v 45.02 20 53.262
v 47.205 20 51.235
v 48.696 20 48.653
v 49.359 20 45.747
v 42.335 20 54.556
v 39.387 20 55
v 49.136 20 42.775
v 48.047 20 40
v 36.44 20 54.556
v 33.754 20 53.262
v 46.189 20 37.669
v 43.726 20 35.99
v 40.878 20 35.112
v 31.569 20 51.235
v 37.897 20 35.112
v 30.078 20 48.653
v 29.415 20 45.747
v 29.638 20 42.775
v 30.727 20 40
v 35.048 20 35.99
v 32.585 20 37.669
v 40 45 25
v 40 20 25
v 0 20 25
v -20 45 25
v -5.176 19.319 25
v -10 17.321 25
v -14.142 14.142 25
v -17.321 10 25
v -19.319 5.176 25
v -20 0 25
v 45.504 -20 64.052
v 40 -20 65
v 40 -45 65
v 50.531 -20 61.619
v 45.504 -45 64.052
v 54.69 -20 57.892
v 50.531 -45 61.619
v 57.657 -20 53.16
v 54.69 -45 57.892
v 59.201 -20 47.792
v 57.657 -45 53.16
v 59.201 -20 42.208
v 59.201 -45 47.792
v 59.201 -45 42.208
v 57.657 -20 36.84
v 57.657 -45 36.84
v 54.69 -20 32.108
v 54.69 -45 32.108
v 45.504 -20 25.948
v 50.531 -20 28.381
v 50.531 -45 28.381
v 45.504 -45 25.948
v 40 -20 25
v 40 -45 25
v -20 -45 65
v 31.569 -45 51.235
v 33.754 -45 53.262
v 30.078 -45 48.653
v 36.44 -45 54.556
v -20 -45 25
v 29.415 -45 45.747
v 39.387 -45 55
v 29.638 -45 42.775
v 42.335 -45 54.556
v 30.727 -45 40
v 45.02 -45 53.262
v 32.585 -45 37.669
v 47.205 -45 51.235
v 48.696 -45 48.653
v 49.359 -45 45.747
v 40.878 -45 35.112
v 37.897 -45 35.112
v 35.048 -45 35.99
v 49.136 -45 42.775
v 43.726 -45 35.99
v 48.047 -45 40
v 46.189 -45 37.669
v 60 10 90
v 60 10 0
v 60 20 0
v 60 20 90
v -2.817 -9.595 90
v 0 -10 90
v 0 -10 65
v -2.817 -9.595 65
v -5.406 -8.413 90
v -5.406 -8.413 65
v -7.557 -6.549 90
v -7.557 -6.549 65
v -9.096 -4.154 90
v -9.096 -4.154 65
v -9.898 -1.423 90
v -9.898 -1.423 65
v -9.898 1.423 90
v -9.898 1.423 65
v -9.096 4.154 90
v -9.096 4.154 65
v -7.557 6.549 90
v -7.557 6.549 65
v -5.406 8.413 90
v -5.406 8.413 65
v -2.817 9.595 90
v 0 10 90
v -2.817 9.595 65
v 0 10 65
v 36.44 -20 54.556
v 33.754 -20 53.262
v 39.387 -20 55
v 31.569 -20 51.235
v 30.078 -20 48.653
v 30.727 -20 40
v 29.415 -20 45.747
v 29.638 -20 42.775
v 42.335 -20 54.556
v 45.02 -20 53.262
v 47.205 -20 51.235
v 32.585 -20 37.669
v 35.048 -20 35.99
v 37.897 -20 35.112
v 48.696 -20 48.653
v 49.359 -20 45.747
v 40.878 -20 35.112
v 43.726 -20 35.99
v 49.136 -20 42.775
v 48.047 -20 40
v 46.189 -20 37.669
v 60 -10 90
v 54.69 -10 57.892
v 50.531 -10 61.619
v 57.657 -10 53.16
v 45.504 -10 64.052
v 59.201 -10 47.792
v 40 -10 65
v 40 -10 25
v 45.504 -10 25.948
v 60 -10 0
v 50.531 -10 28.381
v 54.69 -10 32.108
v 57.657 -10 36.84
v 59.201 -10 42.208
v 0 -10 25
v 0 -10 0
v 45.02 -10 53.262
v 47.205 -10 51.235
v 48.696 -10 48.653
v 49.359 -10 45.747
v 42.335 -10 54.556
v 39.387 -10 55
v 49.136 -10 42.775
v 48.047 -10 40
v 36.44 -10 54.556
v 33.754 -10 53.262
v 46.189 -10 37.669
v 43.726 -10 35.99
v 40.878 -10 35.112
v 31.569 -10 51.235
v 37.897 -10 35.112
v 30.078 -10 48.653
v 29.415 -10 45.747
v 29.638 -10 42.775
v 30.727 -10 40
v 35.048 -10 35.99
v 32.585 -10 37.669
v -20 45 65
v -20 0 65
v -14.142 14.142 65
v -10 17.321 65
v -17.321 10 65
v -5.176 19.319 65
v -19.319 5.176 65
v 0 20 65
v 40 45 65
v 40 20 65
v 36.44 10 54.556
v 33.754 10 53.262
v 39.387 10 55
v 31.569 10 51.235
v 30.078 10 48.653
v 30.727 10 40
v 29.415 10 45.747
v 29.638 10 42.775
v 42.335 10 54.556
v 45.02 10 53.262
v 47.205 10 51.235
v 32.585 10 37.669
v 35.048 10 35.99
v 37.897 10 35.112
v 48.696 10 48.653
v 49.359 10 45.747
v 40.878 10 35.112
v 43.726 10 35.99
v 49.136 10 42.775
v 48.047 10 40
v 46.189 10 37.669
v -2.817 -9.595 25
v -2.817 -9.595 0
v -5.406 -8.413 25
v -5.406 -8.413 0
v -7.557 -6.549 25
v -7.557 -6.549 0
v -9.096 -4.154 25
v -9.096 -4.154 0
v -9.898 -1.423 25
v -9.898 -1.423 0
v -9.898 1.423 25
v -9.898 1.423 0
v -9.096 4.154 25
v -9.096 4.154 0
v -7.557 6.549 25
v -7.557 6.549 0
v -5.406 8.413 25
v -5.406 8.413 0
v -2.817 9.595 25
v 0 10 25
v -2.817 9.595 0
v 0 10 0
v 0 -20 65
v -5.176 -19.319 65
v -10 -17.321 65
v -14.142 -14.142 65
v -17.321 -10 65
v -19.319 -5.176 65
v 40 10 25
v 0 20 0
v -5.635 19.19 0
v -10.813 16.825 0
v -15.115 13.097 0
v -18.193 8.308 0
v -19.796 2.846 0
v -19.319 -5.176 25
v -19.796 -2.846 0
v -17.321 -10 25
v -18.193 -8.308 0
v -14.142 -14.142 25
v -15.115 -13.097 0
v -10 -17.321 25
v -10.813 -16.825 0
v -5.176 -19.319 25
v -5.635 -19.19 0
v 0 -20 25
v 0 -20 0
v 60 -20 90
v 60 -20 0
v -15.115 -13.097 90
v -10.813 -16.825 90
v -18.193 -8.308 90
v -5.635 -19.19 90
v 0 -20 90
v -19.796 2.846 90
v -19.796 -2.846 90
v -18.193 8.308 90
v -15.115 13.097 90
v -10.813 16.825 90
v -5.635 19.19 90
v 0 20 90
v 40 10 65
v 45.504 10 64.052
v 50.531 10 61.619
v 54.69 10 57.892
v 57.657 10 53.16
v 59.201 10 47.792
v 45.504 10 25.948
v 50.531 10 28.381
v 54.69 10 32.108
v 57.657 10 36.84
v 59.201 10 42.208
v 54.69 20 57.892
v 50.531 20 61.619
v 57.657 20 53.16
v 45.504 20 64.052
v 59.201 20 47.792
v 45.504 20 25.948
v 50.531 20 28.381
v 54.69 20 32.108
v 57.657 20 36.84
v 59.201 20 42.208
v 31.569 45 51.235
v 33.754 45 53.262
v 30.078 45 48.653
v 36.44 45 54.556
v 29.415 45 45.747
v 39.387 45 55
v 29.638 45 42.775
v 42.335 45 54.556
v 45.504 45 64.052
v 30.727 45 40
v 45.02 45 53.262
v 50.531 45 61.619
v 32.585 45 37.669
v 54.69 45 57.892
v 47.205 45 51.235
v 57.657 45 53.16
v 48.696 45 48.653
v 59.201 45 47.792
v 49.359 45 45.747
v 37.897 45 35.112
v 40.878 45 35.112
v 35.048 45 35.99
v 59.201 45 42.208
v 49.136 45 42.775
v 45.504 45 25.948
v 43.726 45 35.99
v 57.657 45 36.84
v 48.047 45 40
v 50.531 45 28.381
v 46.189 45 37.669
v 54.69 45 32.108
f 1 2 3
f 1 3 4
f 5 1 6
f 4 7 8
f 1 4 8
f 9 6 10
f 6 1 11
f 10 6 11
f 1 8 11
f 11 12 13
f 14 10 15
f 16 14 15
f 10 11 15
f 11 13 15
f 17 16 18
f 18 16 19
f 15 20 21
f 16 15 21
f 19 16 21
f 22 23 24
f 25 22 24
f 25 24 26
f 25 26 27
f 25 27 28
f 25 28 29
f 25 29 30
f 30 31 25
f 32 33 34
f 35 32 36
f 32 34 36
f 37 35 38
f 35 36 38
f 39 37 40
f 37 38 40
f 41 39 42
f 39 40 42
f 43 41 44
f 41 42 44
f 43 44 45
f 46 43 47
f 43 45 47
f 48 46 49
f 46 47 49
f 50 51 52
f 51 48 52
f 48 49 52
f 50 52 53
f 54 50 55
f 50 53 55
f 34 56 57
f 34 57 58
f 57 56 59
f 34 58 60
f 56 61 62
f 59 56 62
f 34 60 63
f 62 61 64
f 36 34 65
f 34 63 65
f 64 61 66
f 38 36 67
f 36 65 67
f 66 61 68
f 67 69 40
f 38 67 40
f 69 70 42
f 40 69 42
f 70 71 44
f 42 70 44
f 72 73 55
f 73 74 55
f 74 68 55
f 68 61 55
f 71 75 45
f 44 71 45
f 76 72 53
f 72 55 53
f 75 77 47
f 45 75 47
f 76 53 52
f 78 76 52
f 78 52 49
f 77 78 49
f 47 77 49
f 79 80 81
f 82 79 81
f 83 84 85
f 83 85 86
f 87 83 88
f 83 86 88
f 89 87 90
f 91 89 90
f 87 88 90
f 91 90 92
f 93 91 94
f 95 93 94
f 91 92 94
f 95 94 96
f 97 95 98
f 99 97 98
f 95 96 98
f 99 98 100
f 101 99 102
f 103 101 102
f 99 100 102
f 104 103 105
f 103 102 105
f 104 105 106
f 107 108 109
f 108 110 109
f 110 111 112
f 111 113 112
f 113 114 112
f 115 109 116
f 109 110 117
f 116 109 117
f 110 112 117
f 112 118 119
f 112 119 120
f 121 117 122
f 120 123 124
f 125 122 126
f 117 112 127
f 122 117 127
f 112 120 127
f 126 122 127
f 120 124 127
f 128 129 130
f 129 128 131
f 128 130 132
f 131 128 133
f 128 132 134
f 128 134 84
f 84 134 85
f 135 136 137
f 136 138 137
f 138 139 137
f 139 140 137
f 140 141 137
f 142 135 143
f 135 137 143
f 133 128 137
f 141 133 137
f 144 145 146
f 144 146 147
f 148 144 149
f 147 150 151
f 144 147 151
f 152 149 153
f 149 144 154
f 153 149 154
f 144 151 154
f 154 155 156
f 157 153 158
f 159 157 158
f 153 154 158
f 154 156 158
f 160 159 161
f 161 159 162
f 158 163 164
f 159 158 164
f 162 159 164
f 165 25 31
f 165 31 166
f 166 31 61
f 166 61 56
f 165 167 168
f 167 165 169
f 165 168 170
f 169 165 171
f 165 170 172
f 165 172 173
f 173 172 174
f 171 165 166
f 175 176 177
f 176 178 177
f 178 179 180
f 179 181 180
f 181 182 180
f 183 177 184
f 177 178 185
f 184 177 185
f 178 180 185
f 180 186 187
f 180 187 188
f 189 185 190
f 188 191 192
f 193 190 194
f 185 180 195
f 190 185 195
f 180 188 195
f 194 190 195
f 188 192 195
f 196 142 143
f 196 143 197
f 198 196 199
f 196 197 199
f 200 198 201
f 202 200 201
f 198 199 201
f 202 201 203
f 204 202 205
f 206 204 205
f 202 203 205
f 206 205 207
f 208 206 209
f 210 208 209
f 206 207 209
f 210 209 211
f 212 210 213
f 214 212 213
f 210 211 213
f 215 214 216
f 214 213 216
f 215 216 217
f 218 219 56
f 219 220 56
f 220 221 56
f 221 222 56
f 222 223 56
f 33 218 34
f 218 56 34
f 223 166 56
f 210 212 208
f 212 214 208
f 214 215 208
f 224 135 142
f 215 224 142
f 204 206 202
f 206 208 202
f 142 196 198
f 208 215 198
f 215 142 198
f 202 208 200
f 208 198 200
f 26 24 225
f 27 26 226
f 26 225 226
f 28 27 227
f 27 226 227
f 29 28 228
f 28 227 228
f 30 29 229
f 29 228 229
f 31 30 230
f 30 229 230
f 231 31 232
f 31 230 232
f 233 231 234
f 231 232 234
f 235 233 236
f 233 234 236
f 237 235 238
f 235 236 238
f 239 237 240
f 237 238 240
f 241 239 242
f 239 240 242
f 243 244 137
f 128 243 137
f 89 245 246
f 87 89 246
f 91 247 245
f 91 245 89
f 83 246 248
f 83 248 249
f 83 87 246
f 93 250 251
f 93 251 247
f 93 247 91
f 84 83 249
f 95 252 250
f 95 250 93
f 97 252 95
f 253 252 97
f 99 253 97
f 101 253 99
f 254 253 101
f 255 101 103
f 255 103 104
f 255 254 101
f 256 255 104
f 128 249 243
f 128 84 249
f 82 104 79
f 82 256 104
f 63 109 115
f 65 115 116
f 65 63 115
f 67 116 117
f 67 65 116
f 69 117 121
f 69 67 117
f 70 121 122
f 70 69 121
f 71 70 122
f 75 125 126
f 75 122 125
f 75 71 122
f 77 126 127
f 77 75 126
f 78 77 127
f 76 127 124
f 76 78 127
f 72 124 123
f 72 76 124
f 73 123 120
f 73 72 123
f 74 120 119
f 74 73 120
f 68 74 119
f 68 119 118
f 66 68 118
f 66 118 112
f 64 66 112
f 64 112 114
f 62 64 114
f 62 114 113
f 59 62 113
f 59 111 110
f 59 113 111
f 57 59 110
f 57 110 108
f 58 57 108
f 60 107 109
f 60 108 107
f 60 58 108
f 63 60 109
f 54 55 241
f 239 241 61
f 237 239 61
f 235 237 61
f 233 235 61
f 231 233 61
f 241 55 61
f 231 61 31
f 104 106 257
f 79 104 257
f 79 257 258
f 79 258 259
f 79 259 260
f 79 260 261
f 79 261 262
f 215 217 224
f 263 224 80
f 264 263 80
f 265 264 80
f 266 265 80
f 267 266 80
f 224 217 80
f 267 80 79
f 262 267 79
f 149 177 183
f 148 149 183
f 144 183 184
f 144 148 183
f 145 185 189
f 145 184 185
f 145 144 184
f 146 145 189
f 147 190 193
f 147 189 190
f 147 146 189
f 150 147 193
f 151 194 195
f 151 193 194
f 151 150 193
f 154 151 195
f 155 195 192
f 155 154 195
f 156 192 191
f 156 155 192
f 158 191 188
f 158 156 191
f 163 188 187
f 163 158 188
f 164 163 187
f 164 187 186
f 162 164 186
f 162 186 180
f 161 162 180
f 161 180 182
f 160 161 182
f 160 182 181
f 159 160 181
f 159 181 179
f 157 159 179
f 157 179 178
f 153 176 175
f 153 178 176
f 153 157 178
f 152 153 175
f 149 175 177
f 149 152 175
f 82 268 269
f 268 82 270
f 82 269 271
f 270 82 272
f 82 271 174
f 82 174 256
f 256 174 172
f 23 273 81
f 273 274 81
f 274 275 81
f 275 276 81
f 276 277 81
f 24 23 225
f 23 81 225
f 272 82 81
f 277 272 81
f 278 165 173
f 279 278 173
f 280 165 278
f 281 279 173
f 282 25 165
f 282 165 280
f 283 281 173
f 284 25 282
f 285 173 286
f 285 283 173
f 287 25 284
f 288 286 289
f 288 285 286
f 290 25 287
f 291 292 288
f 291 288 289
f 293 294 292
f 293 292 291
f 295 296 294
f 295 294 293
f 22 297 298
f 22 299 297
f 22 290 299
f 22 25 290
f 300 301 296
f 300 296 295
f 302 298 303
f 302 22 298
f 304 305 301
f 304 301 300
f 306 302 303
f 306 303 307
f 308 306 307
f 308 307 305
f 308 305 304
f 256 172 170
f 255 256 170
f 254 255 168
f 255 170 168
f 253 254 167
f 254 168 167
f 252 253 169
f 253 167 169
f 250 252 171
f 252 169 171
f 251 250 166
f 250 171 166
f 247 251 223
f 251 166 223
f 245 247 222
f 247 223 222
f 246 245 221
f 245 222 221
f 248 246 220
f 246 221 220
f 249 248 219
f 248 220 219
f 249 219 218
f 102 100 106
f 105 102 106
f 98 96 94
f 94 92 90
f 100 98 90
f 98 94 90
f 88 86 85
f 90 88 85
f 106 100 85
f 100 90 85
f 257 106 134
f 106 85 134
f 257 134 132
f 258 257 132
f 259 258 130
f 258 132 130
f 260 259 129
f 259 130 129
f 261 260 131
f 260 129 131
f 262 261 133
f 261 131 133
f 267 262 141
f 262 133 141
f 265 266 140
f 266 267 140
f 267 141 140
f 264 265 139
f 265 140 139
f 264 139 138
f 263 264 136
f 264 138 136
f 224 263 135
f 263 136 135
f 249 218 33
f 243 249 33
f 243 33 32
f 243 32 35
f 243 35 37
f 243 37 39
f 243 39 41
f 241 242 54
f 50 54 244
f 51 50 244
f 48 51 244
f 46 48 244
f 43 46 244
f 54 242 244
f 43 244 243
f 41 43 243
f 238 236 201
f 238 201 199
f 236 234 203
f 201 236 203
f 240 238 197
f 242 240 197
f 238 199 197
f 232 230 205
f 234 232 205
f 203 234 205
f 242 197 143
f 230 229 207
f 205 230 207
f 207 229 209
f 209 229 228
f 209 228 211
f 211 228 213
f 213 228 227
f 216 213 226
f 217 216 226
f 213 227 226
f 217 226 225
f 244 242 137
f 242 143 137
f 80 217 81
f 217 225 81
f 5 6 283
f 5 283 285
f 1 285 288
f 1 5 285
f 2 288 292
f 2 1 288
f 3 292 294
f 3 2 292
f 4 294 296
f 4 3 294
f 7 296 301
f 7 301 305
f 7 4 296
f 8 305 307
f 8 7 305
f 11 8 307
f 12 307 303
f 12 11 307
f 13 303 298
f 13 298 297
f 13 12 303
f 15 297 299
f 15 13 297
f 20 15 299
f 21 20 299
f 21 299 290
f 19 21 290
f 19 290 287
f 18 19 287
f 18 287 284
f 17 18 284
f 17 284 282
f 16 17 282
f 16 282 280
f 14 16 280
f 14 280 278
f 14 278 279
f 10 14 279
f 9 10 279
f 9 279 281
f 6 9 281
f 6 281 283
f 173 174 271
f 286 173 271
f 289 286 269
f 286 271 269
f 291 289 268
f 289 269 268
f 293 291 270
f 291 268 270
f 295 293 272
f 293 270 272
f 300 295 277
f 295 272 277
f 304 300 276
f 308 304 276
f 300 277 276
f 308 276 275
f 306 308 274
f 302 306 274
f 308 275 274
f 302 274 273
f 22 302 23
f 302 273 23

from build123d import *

# Parameters (mm, degrees)
EXTRUDE_1_DEPTH      = 90
EXTRUDE_3_DEPTH      = 45
EXTRUDE_3_DEPTH_BACK = 45
SKETCH_2_R           = 10


with BuildPart() as part:
    # Эскиз1 → Вытянуть-Тонкостенный1 (new body)
    with BuildSketch(Plane.XY):
        with BuildLine():
            Line((60, 20), (0, 20))
            ThreePointArc((0, 20), (-20, 0), (0, -20))
            Line((0, -20), (60, -20))
            Line((60, -20), (60, -10))
            Line((60, -10), (0, -10))
            ThreePointArc((0, -10), (-10, 0), (0, 10))
            Line((0, 10), (60, 10))
            Line((60, 10), (60, 20))
        make_face()
    extrude(amount=EXTRUDE_1_DEPTH)

    # Эскиз2 → Бобышка-Вытянуть3 (add, two sides: drawn at the far end of the back side and taken through both)
    with BuildSketch(Plane(origin=(0, 0, 0), x_dir=(1, 0, 0), z_dir=(0, 1, 0)).offset(-EXTRUDE_3_DEPTH_BACK)):
        with BuildLine():
            Line((-20, -25), (-20, -65))
            Line((-20, -65), (40, -65))
            ThreePointArc((40, -65), (59.396542923, -45), (40, -25))
            Line((40, -25), (-20, -25))
        make_face()
        with Locations(Location((39.387155672, -45, 0), (0, 0, 270))):
            Circle(SKETCH_2_R, mode=Mode.SUBTRACT)
    extrude(amount=EXTRUDE_3_DEPTH + EXTRUDE_3_DEPTH_BACK)


solid = part.part
